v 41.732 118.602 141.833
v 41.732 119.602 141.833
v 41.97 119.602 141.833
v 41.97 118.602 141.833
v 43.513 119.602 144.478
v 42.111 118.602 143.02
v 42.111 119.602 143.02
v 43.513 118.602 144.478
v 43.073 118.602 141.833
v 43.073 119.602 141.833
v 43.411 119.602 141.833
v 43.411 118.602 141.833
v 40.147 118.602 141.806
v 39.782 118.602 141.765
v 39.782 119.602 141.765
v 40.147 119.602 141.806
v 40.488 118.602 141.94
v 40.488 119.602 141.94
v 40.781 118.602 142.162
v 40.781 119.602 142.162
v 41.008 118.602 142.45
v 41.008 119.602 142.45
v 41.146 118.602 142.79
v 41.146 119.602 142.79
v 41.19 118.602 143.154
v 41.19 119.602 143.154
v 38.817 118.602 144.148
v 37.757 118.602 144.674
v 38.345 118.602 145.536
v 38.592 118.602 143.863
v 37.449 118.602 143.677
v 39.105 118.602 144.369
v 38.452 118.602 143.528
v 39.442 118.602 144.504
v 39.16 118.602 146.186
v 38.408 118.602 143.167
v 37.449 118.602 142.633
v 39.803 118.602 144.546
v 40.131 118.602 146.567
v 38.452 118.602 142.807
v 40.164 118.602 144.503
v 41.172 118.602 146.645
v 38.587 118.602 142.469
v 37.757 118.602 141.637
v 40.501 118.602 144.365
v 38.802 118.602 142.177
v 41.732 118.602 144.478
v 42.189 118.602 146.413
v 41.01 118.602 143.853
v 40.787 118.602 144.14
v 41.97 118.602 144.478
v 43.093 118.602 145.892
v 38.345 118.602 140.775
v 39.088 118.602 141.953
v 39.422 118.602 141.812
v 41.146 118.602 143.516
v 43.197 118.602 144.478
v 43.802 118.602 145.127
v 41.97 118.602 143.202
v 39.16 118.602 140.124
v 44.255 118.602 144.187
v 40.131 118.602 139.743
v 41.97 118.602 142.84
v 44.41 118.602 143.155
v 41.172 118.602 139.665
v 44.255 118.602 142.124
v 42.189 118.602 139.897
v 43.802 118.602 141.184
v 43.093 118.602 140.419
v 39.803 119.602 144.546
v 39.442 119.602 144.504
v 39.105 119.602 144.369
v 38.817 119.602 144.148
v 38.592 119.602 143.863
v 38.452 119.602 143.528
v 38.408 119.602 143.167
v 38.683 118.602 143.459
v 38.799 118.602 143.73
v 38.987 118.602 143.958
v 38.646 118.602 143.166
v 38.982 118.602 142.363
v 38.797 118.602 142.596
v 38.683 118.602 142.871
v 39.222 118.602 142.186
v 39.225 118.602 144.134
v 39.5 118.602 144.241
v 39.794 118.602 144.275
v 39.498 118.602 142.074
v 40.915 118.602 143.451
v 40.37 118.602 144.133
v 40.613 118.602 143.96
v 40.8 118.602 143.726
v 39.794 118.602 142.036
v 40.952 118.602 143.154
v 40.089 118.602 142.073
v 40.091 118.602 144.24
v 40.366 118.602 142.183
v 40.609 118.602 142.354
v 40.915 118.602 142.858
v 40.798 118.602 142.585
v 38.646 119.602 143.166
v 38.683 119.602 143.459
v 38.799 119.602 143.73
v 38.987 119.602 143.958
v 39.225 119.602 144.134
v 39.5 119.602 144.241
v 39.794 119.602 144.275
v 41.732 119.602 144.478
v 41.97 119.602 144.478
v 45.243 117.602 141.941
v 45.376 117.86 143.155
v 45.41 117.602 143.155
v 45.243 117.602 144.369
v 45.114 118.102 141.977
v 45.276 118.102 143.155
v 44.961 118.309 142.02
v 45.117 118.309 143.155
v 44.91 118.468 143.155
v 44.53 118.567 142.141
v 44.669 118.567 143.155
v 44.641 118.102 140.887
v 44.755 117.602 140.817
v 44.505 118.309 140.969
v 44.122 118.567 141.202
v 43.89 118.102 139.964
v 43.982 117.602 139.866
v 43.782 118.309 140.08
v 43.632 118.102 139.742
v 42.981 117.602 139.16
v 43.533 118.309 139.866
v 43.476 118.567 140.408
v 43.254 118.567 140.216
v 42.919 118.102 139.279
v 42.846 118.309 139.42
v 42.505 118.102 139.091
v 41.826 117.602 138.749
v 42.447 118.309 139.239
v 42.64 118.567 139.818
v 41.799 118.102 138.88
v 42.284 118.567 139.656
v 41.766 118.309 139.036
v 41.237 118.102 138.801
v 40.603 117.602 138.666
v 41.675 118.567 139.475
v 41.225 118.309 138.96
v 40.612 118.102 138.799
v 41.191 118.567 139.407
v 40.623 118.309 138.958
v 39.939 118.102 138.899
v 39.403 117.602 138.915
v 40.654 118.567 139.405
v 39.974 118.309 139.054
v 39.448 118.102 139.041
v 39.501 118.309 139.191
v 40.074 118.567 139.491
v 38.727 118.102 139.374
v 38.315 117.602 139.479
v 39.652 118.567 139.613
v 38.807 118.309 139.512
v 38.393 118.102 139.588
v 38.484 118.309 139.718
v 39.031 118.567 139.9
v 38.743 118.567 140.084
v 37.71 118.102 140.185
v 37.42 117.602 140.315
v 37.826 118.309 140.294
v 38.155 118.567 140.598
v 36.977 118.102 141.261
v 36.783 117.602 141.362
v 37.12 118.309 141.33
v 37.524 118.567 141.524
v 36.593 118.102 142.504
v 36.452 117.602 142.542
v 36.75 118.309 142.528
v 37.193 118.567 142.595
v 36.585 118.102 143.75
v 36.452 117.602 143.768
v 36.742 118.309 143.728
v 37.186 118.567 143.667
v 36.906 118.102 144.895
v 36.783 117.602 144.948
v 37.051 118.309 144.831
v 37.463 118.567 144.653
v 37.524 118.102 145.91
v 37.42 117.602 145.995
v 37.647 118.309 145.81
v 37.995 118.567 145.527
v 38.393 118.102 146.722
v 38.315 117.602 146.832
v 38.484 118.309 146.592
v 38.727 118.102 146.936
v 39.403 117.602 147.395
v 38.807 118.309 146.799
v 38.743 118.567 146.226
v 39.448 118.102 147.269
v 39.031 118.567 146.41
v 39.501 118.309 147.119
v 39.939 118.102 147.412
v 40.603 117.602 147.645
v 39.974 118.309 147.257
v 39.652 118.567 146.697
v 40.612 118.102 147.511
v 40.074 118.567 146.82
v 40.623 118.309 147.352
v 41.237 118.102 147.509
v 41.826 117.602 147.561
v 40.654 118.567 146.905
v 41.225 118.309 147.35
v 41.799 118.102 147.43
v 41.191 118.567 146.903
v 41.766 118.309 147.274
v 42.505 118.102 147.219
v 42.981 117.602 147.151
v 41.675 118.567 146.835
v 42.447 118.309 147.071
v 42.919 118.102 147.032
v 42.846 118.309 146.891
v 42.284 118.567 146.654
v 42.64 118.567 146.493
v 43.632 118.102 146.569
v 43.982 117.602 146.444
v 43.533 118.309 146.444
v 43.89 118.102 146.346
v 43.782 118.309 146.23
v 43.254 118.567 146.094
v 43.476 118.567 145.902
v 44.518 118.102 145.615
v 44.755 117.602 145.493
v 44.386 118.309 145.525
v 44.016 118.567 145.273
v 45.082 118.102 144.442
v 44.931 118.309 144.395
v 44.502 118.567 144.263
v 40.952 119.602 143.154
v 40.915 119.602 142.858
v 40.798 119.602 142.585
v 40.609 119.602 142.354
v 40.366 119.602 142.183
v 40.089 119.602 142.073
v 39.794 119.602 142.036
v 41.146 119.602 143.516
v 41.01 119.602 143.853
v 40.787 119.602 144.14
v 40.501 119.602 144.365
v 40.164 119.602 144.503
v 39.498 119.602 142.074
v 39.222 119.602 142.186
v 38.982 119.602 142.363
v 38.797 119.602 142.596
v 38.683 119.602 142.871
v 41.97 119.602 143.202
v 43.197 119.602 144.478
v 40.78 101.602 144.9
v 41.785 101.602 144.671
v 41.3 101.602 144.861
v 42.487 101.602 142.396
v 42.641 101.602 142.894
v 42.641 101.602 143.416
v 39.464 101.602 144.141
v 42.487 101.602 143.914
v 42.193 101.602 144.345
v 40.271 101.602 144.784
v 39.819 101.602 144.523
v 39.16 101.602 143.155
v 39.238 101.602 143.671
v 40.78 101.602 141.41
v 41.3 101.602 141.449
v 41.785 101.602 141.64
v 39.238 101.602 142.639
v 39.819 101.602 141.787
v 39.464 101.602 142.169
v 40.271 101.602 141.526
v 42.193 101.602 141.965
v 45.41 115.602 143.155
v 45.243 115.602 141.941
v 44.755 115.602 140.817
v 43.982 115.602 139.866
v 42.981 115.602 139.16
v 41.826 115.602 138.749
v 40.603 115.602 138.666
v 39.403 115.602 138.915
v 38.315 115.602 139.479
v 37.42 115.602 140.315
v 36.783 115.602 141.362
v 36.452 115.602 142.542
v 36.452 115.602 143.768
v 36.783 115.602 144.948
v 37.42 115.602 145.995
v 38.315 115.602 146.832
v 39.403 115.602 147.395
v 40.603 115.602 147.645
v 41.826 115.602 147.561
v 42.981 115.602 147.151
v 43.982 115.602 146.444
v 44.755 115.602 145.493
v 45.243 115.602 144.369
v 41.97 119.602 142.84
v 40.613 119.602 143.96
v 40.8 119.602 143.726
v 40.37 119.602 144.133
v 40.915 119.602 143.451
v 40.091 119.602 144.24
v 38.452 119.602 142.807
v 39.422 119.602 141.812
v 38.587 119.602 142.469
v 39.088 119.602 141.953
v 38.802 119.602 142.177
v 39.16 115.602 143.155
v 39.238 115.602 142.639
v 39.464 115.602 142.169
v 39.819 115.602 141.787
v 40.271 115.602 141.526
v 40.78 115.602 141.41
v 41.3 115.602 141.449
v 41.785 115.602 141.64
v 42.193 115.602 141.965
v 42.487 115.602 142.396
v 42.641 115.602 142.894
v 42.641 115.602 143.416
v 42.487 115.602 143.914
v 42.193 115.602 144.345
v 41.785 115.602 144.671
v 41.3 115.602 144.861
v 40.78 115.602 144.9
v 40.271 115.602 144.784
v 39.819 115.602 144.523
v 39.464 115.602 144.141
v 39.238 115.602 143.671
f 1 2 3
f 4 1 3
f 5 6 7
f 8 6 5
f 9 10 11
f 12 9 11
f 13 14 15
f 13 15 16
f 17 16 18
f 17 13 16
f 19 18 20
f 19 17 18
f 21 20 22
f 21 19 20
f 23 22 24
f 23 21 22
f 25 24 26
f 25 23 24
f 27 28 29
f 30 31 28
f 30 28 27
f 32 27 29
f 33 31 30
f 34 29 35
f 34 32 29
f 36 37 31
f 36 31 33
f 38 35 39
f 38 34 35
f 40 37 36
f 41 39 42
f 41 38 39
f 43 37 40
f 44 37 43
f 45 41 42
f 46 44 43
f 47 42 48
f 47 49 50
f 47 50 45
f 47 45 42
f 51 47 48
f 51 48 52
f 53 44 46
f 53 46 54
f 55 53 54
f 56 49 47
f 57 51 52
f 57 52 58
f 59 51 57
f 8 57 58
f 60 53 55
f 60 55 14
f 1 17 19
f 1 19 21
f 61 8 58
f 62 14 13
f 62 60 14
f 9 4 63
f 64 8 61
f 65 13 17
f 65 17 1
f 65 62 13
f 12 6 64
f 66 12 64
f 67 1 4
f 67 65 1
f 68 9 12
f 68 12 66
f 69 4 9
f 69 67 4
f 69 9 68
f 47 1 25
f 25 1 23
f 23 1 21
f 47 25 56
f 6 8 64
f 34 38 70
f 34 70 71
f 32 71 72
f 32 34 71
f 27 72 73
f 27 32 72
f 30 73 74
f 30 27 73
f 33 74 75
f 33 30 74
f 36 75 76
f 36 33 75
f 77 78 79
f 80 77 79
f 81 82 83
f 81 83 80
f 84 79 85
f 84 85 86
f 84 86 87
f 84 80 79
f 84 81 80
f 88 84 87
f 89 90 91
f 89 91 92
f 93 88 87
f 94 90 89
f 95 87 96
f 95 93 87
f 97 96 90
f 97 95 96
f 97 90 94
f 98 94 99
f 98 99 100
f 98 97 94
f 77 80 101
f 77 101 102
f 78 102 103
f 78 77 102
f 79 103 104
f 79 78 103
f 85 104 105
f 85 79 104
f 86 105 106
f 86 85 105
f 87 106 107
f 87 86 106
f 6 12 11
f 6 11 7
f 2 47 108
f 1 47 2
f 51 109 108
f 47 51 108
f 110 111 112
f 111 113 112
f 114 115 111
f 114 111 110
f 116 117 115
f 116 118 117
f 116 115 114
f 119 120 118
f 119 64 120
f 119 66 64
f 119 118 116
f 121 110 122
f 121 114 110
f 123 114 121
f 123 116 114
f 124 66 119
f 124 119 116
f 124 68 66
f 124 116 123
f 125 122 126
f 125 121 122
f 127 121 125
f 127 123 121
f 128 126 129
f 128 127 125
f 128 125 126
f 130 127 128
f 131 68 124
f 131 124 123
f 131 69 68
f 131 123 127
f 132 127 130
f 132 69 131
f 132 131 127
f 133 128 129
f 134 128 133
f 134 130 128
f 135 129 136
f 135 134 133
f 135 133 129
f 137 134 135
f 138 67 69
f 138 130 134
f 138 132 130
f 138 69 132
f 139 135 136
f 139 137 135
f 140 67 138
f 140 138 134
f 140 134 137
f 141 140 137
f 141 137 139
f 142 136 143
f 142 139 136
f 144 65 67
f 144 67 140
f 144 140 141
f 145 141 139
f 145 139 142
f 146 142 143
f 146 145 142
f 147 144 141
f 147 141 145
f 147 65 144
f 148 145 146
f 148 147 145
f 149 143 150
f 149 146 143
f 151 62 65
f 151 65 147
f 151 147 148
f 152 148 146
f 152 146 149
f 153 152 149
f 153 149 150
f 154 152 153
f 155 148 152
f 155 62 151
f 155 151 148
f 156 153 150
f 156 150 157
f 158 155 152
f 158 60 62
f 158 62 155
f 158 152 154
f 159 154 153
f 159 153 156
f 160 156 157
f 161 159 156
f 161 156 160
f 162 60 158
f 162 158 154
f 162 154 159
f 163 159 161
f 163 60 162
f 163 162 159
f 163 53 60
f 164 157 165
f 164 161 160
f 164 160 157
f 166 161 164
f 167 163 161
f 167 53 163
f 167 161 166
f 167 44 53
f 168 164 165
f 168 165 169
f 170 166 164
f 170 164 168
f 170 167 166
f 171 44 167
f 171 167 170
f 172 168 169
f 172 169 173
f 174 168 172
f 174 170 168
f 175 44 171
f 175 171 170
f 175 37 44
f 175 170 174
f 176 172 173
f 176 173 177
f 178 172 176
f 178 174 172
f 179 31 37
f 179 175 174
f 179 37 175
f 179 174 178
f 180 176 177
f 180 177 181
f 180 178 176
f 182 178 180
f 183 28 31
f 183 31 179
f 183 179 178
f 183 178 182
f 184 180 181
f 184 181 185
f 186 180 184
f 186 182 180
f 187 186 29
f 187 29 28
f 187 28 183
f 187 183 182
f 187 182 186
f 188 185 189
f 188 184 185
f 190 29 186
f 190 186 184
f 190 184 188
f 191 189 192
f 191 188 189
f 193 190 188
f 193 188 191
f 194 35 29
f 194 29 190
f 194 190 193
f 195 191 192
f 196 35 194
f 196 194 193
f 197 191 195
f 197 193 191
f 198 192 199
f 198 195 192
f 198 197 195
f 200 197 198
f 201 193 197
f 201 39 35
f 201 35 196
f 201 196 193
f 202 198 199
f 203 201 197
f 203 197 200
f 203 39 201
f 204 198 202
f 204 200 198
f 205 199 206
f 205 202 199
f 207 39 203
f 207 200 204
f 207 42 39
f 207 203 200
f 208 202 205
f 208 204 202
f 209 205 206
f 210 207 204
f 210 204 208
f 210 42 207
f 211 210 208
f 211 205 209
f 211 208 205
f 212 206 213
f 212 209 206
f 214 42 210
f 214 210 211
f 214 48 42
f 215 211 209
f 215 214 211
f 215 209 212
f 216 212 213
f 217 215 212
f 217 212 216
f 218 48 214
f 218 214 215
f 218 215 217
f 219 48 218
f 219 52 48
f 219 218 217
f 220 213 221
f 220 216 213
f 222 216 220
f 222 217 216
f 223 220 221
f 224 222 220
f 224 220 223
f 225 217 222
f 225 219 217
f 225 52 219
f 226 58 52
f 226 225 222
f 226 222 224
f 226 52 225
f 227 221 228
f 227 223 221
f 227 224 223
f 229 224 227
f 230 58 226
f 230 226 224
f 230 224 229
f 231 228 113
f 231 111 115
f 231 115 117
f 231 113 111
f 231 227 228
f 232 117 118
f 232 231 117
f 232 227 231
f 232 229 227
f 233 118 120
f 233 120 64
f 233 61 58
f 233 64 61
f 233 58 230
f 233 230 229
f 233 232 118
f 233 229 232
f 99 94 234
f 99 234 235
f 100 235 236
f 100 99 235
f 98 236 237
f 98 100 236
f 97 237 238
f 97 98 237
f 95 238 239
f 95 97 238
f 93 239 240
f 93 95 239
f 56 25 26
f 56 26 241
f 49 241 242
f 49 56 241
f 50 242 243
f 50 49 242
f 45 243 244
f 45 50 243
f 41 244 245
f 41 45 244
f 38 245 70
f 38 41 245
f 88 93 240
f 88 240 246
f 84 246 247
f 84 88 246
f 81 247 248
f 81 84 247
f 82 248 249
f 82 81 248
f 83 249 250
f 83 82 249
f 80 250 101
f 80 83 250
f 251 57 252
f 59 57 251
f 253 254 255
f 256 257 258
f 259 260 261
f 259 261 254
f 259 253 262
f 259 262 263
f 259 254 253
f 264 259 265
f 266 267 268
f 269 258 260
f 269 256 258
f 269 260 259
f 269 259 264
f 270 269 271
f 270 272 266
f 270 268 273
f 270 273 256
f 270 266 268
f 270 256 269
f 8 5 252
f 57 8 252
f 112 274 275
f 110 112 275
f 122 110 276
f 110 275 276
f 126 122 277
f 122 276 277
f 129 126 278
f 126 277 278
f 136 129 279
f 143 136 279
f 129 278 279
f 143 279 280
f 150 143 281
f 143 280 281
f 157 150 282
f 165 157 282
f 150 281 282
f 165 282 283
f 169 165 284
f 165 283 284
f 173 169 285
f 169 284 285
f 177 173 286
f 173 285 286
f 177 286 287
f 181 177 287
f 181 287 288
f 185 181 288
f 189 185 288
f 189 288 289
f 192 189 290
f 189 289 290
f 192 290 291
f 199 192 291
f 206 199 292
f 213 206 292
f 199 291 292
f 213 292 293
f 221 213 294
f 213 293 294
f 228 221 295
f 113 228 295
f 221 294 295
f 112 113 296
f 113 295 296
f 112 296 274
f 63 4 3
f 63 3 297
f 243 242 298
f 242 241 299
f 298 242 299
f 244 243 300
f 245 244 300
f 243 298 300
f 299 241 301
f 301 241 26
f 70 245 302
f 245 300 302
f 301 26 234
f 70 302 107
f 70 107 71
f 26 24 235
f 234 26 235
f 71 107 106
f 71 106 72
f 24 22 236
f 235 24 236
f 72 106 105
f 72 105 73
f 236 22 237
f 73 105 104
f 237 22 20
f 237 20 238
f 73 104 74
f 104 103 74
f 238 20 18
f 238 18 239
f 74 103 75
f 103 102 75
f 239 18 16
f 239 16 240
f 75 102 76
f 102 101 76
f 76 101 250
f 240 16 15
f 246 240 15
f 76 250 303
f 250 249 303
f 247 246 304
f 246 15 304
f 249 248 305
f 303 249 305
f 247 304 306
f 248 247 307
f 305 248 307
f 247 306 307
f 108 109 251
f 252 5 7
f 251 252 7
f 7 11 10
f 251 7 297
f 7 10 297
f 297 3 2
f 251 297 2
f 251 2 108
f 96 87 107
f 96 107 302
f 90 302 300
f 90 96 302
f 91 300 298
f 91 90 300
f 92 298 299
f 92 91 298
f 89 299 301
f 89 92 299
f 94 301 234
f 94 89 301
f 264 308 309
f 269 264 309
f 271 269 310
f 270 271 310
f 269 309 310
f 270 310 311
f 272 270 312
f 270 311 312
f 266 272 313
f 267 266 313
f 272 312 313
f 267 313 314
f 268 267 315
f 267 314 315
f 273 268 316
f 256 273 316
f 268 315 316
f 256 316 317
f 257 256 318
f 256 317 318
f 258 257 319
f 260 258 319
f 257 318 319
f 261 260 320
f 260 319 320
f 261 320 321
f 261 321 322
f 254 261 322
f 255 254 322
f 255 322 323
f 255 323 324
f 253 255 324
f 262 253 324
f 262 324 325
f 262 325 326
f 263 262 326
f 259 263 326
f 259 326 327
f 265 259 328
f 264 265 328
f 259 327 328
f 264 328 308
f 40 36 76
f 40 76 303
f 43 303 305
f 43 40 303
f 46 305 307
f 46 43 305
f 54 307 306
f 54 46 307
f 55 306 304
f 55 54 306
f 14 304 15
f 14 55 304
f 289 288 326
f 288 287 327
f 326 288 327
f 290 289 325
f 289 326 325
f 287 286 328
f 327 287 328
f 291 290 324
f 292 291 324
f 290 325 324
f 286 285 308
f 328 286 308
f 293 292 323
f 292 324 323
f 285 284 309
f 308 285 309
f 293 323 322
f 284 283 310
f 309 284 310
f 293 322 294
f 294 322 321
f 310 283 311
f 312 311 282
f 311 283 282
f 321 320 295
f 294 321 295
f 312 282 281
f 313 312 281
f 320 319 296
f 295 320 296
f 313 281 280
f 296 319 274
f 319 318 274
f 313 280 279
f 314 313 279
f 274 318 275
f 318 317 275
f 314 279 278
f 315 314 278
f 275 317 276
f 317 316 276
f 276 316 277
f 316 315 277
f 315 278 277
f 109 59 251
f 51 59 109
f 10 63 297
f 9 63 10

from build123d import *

# Parameters (mm, degrees)
SKETCH1_R           = 4.5
BOSS_EXTRUDE1_DEPTH = 3
FILLET1_R           = 1
SKETCH6_R           = 1.75
BOSS_EXTRUDE3_DEPTH = 14
BOSS_EXTRUDE4_DEPTH = 1


with BuildPart() as part:
    # Sketch1 → Boss-Extrude1 (new body)
    with BuildSketch(Plane(origin=(0, 115.601531763, -5.053e-06), x_dir=(1, 0, 0), z_dir=(0, 1, -4.4e-08))):
        with Locations((40.91030477, -143.155151275)):
            Circle(SKETCH1_R)
    extrude(amount=BOSS_EXTRUDE1_DEPTH)

    # Fillet1
    fillet1_edges = [part.edges().sort_by_distance(p)[0] for p in [
        (36.41030477, 118.601538021, 143.155146091),
    ]]
    fillet(fillet1_edges, radius=FILLET1_R)

    # Sketch6 → Boss-Extrude3 (add)
    with BuildSketch(Plane(origin=(0, 115.601531763, -5.053e-06), x_dir=(-1, 0, 0), z_dir=(0, -1, 4.4e-08))):
        with Locations((-40.91030477, -143.155151275)):
            Circle(SKETCH6_R)
    extrude(amount=BOSS_EXTRUDE3_DEPTH)

    # Sketch7 → Boss-Extrude4 (add)
    with BuildSketch(Plane(origin=(0, 118.601531763, -5.184e-06), x_dir=(1, 0, 0), z_dir=(0, 1, -4.4e-08))):
        with BuildLine():
            add(Edge.make_bspline(
                [(39.781937709, -141.764742389), (39.830929551, -141.76598327), (39.927153571, -141.768420461), (40.068573285, -141.787076688), (40.203582672, -141.81935237), (40.333281527, -141.862338077), (40.45611848, -141.91968038), (40.573018119, -141.988989986), (40.683702303, -142.070993023), (40.786679181, -142.165055594), (40.880913899, -142.267399038), (40.96393704, -142.376617458), (41.033516631, -142.492050481), (41.090655886, -142.613351228), (41.135482812, -142.740245371), (41.16641566, -142.873409408), (41.186174857, -143.011980537), (41.188484879, -143.106494893), (41.189656726, -143.154440907)],
                knots=[0, 0, 0, 0, 0.000146952, 0.000288625, 0.000426954, 0.000562883, 0.000697813, 0.000832796, 0.000969967, 0.001110296, 0.00125059, 0.001386805, 0.001521151, 0.001654161, 0.00178843, 0.001924058, 0.002063701, 0.002207476, 0.002207476, 0.002207476, 0.002207476], degree=3))
            add(Edge.make_bspline(
                [(41.189656726, -143.154440907), (41.188485051, -143.202033739), (41.186175543, -143.295844723), (41.166393194, -143.433536493), (41.135368152, -143.565896722), (41.091072165, -143.692704448), (41.034205286, -143.814093439), (40.964162388, -143.929744292), (40.88165683, -144.039694918), (40.787762365, -144.142740802), (40.685405625, -144.237232938), (40.575618459, -144.319570421), (40.460869938, -144.390421396), (40.339683432, -144.446954293), (40.213666142, -144.492139018), (40.08169022, -144.522946066), (39.944374075, -144.542817819), (39.850733494, -144.545099673), (39.803138297, -144.546259483)],
                knots=[0, 0, 0, 0, 0.000142716, 0.000281309, 0.000416421, 0.000550016, 0.000683505, 0.000817851, 0.000954912, 0.001095241, 0.001235536, 0.001372174, 0.001506342, 0.001639351, 0.001772621, 0.001907218, 0.002045287, 0.002188002, 0.002188002, 0.002188002, 0.002188002], degree=3))
            add(Edge.make_bspline(
                [(39.803138297, -144.546259483), (39.755192532, -144.545088221), (39.660678666, -144.54277935), (39.521933407, -144.522987455), (39.388675827, -144.492037779), (39.261287002, -144.447807431), (39.139695894, -144.390644406), (39.023664701, -144.320942286), (38.913659155, -144.238235697), (38.810591287, -144.144371679), (38.716286834, -144.042188423), (38.634069925, -143.932700623), (38.564352131, -143.818056319), (38.50738104, -143.697937357), (38.46227755, -143.572924422), (38.431506646, -143.442183608), (38.41159792, -143.306460291), (38.409303721, -143.214050481), (38.408139632, -143.16716126)],
                knots=[0, 0, 0, 0, 0.000143775, 0.000283418, 0.000419562, 0.000553657, 0.000687146, 0.000821946, 0.000959007, 0.001099336, 0.001239631, 0.001375527, 0.001509419, 0.001641471, 0.001773742, 0.001907308, 0.002043802, 0.0021844, 0.0021844, 0.0021844, 0.0021844], degree=3))
            add(Edge.make_bspline(
                [(38.408139632, -143.16716126), (38.408543791, -143.135688944), (38.40934701, -143.073141351), (38.419016921, -142.980260052), (38.433048683, -142.888872471), (38.453158462, -142.799238481), (38.479459306, -142.711577499), (38.510492683, -142.625284958), (38.548396019, -142.541235357), (38.59124389, -142.459030531), (38.639066804, -142.379951936), (38.691889543, -142.305203679), (38.747856756, -142.234158521), (38.809212417, -142.168657512), (38.873934373, -142.106795165), (38.943072551, -142.049522158), (39.016205081, -141.996322047), (39.093646642, -141.948379289), (39.173489029, -141.905018514), (39.255794688, -141.867809139), (39.339445787, -141.835873128), (39.424834122, -141.809988695), (39.511732943, -141.789553763), (39.600331912, -141.77563868), (39.690560442, -141.765944106), (39.75134757, -141.765144685), (39.781937709, -141.764742389)],
                knots=[0, 0, 0, 0, 9.438e-05, 0.000187569, 0.000279848, 0.000371657, 0.000462884, 0.000554264, 0.000646556, 0.00073925, 0.000832238, 0.000923551, 0.001013693, 0.001103328, 0.001192553, 0.001282131, 0.001372457, 0.00146364, 0.001555178, 0.001644836, 0.001734413, 0.00182361, 0.001912319, 0.002001981, 0.002092533, 0.002184264, 0.002184264, 0.002184264, 0.002184264], degree=3))
        make_face()
        with BuildLine():
            add(Edge.make_bspline(
                [(39.793598032, -142.036109911), (39.768489351, -142.036415989), (39.718512029, -142.037025218), (39.6442136, -142.045050193), (39.570892316, -142.056487669), (39.498533037, -142.072802271), (39.42743852, -142.095030335), (39.356946081, -142.12061245), (39.287698534, -142.151773631), (39.219924487, -142.186980378), (39.154220829, -142.225948908), (39.092223132, -142.269016851), (39.033770895, -142.31517421), (38.979007235, -142.364528706), (38.928092956, -142.417331679), (38.88002595, -142.472782628), (38.836732873, -142.532466498), (38.797056276, -142.594764841), (38.761550826, -142.659596512), (38.729978206, -142.726278968), (38.704151843, -142.795356148), (38.683089213, -142.866078636), (38.665626856, -142.938334424), (38.654564306, -143.012671643), (38.646451153, -143.088716757), (38.645876746, -143.140107802), (38.645586213, -143.16610123)],
                knots=[0, 0, 0, 0, 7.5292e-05, 0.000149864, 0.00022393, 0.000297861, 0.000372133, 0.000447257, 0.000522705, 0.000599749, 0.000676284, 0.000751707, 0.000826039, 0.000899591, 0.000972681, 0.001045978, 0.001119549, 0.001193655, 0.001267426, 0.001341167, 0.0014148, 0.001488412, 0.001562462, 0.001637575, 0.001713729, 0.00179167, 0.00179167, 0.00179167, 0.00179167], degree=3))
            add(Edge.make_bspline(
                [(38.645586213, -143.16610123), (38.646549948, -143.204323861), (38.648445913, -143.279519602), (38.66504479, -143.389713377), (38.690612592, -143.495613451), (38.728302387, -143.59664037), (38.775436483, -143.693662536), (38.833665144, -143.785819258), (38.902652667, -143.873135443), (38.981017357, -143.95500151), (39.066683927, -144.029724231), (39.15764974, -144.095313236), (39.252940265, -144.150807889), (39.352803996, -144.196017676), (39.45670779, -144.231842061), (39.565321177, -144.25639436), (39.677920631, -144.272553186), (39.754672972, -144.274104972), (39.793598032, -144.274891962)],
                knots=[0, 0, 0, 0, 0.000114606, 0.000225465, 0.000333574, 0.000440894, 0.000548272, 0.000656647, 0.000767237, 0.000881574, 0.000996152, 0.001107795, 0.001217519, 0.00132639, 0.001436175, 0.001546614, 0.001660023, 0.001776724, 0.001776724, 0.001776724, 0.001776724], degree=3))
            add(Edge.make_bspline(
                [(39.793598032, -144.274891962), (39.819761167, -144.274532503), (39.871650522, -144.273819589), (39.948829875, -144.266639042), (40.024618797, -144.255124474), (40.098910985, -144.238545942), (40.171622122, -144.217797161), (40.243055694, -144.193147272), (40.31245083, -144.162394219), (40.380682969, -144.128415708), (40.445994414, -144.089680589), (40.508341989, -144.048074369), (40.566154188, -144.001984995), (40.620876879, -143.953363791), (40.672000191, -143.901230406), (40.719178411, -143.845652619), (40.762252678, -143.786279622), (40.801914208, -143.724075774), (40.837295246, -143.659066702), (40.868122303, -143.592142481), (40.89427532, -143.523467905), (40.915387939, -143.452943919), (40.931932306, -143.380704468), (40.943332007, -143.306652825), (40.951306125, -143.230937132), (40.951907165, -143.179726003), (40.952210145, -143.153910892)],
                knots=[0, 0, 0, 0, 7.8471e-05, 0.000155631, 0.000232315, 0.000308314, 0.000383811, 0.000459075, 0.000534795, 0.000611356, 0.000687621, 0.000762445, 0.000836033, 0.000909231, 0.000981942, 0.001054895, 0.001127725, 0.001201831, 0.001276067, 0.001349584, 0.001422723, 0.001496334, 0.001570264, 0.001644854, 0.001721008, 0.001798419, 0.001798419, 0.001798419, 0.001798419], degree=3))
            add(Edge.make_bspline(
                [(40.952210145, -143.153910892), (40.951906923, -143.128272386), (40.951305425, -143.077413686), (40.943335816, -143.002226044), (40.931920262, -142.928707247), (40.915468691, -142.85714592), (40.894264111, -142.787523821), (40.868117736, -142.719906339), (40.837285992, -142.654041572), (40.801901203, -142.590092312), (40.762126146, -142.528728075), (40.718663236, -142.470064347), (40.67076205, -142.41520281), (40.619791186, -142.362789083), (40.564477481, -142.313941036), (40.505071497, -142.268642464), (40.442294431, -142.225800167), (40.375825628, -142.187151677), (40.30722752, -142.151459965), (40.236837802, -142.120880933), (40.165453899, -142.094897248), (40.093257338, -142.072735018), (40.019640444, -142.056551567), (39.945100645, -142.045039886), (39.869741068, -142.037028011), (39.819059587, -142.036416915), (39.793598032, -142.036109911)],
                knots=[0, 0, 0, 0, 7.6881e-05, 0.000152508, 0.000226574, 0.000299988, 0.000372585, 0.000444733, 0.000517289, 0.000590596, 0.000663809, 0.000736527, 0.000809423, 0.000882134, 0.000955727, 0.00103057, 0.00110613, 0.001183578, 0.001261092, 0.001337996, 0.001413617, 0.001488903, 0.001564385, 0.001639498, 0.001715125, 0.001791477, 0.001791477, 0.001791477, 0.001791477], degree=3))
        make_face(mode=Mode.SUBTRACT)
        Polygon((41.732391769, -141.83258427), (41.96983835, -141.83258427), (41.96983835, -142.840142196), (43.07279892, -141.83258427), (43.411478307, -141.83258427), (42.111352272, -143.019817176), (43.513241128, -144.478417603), (43.196822358, -144.478417603), (41.96983835, -143.201612214), (41.96983835, -144.478417603), (41.732391769, -144.478417603), align=None)
    extrude(amount=BOSS_EXTRUDE4_DEPTH)


solid = part.part
